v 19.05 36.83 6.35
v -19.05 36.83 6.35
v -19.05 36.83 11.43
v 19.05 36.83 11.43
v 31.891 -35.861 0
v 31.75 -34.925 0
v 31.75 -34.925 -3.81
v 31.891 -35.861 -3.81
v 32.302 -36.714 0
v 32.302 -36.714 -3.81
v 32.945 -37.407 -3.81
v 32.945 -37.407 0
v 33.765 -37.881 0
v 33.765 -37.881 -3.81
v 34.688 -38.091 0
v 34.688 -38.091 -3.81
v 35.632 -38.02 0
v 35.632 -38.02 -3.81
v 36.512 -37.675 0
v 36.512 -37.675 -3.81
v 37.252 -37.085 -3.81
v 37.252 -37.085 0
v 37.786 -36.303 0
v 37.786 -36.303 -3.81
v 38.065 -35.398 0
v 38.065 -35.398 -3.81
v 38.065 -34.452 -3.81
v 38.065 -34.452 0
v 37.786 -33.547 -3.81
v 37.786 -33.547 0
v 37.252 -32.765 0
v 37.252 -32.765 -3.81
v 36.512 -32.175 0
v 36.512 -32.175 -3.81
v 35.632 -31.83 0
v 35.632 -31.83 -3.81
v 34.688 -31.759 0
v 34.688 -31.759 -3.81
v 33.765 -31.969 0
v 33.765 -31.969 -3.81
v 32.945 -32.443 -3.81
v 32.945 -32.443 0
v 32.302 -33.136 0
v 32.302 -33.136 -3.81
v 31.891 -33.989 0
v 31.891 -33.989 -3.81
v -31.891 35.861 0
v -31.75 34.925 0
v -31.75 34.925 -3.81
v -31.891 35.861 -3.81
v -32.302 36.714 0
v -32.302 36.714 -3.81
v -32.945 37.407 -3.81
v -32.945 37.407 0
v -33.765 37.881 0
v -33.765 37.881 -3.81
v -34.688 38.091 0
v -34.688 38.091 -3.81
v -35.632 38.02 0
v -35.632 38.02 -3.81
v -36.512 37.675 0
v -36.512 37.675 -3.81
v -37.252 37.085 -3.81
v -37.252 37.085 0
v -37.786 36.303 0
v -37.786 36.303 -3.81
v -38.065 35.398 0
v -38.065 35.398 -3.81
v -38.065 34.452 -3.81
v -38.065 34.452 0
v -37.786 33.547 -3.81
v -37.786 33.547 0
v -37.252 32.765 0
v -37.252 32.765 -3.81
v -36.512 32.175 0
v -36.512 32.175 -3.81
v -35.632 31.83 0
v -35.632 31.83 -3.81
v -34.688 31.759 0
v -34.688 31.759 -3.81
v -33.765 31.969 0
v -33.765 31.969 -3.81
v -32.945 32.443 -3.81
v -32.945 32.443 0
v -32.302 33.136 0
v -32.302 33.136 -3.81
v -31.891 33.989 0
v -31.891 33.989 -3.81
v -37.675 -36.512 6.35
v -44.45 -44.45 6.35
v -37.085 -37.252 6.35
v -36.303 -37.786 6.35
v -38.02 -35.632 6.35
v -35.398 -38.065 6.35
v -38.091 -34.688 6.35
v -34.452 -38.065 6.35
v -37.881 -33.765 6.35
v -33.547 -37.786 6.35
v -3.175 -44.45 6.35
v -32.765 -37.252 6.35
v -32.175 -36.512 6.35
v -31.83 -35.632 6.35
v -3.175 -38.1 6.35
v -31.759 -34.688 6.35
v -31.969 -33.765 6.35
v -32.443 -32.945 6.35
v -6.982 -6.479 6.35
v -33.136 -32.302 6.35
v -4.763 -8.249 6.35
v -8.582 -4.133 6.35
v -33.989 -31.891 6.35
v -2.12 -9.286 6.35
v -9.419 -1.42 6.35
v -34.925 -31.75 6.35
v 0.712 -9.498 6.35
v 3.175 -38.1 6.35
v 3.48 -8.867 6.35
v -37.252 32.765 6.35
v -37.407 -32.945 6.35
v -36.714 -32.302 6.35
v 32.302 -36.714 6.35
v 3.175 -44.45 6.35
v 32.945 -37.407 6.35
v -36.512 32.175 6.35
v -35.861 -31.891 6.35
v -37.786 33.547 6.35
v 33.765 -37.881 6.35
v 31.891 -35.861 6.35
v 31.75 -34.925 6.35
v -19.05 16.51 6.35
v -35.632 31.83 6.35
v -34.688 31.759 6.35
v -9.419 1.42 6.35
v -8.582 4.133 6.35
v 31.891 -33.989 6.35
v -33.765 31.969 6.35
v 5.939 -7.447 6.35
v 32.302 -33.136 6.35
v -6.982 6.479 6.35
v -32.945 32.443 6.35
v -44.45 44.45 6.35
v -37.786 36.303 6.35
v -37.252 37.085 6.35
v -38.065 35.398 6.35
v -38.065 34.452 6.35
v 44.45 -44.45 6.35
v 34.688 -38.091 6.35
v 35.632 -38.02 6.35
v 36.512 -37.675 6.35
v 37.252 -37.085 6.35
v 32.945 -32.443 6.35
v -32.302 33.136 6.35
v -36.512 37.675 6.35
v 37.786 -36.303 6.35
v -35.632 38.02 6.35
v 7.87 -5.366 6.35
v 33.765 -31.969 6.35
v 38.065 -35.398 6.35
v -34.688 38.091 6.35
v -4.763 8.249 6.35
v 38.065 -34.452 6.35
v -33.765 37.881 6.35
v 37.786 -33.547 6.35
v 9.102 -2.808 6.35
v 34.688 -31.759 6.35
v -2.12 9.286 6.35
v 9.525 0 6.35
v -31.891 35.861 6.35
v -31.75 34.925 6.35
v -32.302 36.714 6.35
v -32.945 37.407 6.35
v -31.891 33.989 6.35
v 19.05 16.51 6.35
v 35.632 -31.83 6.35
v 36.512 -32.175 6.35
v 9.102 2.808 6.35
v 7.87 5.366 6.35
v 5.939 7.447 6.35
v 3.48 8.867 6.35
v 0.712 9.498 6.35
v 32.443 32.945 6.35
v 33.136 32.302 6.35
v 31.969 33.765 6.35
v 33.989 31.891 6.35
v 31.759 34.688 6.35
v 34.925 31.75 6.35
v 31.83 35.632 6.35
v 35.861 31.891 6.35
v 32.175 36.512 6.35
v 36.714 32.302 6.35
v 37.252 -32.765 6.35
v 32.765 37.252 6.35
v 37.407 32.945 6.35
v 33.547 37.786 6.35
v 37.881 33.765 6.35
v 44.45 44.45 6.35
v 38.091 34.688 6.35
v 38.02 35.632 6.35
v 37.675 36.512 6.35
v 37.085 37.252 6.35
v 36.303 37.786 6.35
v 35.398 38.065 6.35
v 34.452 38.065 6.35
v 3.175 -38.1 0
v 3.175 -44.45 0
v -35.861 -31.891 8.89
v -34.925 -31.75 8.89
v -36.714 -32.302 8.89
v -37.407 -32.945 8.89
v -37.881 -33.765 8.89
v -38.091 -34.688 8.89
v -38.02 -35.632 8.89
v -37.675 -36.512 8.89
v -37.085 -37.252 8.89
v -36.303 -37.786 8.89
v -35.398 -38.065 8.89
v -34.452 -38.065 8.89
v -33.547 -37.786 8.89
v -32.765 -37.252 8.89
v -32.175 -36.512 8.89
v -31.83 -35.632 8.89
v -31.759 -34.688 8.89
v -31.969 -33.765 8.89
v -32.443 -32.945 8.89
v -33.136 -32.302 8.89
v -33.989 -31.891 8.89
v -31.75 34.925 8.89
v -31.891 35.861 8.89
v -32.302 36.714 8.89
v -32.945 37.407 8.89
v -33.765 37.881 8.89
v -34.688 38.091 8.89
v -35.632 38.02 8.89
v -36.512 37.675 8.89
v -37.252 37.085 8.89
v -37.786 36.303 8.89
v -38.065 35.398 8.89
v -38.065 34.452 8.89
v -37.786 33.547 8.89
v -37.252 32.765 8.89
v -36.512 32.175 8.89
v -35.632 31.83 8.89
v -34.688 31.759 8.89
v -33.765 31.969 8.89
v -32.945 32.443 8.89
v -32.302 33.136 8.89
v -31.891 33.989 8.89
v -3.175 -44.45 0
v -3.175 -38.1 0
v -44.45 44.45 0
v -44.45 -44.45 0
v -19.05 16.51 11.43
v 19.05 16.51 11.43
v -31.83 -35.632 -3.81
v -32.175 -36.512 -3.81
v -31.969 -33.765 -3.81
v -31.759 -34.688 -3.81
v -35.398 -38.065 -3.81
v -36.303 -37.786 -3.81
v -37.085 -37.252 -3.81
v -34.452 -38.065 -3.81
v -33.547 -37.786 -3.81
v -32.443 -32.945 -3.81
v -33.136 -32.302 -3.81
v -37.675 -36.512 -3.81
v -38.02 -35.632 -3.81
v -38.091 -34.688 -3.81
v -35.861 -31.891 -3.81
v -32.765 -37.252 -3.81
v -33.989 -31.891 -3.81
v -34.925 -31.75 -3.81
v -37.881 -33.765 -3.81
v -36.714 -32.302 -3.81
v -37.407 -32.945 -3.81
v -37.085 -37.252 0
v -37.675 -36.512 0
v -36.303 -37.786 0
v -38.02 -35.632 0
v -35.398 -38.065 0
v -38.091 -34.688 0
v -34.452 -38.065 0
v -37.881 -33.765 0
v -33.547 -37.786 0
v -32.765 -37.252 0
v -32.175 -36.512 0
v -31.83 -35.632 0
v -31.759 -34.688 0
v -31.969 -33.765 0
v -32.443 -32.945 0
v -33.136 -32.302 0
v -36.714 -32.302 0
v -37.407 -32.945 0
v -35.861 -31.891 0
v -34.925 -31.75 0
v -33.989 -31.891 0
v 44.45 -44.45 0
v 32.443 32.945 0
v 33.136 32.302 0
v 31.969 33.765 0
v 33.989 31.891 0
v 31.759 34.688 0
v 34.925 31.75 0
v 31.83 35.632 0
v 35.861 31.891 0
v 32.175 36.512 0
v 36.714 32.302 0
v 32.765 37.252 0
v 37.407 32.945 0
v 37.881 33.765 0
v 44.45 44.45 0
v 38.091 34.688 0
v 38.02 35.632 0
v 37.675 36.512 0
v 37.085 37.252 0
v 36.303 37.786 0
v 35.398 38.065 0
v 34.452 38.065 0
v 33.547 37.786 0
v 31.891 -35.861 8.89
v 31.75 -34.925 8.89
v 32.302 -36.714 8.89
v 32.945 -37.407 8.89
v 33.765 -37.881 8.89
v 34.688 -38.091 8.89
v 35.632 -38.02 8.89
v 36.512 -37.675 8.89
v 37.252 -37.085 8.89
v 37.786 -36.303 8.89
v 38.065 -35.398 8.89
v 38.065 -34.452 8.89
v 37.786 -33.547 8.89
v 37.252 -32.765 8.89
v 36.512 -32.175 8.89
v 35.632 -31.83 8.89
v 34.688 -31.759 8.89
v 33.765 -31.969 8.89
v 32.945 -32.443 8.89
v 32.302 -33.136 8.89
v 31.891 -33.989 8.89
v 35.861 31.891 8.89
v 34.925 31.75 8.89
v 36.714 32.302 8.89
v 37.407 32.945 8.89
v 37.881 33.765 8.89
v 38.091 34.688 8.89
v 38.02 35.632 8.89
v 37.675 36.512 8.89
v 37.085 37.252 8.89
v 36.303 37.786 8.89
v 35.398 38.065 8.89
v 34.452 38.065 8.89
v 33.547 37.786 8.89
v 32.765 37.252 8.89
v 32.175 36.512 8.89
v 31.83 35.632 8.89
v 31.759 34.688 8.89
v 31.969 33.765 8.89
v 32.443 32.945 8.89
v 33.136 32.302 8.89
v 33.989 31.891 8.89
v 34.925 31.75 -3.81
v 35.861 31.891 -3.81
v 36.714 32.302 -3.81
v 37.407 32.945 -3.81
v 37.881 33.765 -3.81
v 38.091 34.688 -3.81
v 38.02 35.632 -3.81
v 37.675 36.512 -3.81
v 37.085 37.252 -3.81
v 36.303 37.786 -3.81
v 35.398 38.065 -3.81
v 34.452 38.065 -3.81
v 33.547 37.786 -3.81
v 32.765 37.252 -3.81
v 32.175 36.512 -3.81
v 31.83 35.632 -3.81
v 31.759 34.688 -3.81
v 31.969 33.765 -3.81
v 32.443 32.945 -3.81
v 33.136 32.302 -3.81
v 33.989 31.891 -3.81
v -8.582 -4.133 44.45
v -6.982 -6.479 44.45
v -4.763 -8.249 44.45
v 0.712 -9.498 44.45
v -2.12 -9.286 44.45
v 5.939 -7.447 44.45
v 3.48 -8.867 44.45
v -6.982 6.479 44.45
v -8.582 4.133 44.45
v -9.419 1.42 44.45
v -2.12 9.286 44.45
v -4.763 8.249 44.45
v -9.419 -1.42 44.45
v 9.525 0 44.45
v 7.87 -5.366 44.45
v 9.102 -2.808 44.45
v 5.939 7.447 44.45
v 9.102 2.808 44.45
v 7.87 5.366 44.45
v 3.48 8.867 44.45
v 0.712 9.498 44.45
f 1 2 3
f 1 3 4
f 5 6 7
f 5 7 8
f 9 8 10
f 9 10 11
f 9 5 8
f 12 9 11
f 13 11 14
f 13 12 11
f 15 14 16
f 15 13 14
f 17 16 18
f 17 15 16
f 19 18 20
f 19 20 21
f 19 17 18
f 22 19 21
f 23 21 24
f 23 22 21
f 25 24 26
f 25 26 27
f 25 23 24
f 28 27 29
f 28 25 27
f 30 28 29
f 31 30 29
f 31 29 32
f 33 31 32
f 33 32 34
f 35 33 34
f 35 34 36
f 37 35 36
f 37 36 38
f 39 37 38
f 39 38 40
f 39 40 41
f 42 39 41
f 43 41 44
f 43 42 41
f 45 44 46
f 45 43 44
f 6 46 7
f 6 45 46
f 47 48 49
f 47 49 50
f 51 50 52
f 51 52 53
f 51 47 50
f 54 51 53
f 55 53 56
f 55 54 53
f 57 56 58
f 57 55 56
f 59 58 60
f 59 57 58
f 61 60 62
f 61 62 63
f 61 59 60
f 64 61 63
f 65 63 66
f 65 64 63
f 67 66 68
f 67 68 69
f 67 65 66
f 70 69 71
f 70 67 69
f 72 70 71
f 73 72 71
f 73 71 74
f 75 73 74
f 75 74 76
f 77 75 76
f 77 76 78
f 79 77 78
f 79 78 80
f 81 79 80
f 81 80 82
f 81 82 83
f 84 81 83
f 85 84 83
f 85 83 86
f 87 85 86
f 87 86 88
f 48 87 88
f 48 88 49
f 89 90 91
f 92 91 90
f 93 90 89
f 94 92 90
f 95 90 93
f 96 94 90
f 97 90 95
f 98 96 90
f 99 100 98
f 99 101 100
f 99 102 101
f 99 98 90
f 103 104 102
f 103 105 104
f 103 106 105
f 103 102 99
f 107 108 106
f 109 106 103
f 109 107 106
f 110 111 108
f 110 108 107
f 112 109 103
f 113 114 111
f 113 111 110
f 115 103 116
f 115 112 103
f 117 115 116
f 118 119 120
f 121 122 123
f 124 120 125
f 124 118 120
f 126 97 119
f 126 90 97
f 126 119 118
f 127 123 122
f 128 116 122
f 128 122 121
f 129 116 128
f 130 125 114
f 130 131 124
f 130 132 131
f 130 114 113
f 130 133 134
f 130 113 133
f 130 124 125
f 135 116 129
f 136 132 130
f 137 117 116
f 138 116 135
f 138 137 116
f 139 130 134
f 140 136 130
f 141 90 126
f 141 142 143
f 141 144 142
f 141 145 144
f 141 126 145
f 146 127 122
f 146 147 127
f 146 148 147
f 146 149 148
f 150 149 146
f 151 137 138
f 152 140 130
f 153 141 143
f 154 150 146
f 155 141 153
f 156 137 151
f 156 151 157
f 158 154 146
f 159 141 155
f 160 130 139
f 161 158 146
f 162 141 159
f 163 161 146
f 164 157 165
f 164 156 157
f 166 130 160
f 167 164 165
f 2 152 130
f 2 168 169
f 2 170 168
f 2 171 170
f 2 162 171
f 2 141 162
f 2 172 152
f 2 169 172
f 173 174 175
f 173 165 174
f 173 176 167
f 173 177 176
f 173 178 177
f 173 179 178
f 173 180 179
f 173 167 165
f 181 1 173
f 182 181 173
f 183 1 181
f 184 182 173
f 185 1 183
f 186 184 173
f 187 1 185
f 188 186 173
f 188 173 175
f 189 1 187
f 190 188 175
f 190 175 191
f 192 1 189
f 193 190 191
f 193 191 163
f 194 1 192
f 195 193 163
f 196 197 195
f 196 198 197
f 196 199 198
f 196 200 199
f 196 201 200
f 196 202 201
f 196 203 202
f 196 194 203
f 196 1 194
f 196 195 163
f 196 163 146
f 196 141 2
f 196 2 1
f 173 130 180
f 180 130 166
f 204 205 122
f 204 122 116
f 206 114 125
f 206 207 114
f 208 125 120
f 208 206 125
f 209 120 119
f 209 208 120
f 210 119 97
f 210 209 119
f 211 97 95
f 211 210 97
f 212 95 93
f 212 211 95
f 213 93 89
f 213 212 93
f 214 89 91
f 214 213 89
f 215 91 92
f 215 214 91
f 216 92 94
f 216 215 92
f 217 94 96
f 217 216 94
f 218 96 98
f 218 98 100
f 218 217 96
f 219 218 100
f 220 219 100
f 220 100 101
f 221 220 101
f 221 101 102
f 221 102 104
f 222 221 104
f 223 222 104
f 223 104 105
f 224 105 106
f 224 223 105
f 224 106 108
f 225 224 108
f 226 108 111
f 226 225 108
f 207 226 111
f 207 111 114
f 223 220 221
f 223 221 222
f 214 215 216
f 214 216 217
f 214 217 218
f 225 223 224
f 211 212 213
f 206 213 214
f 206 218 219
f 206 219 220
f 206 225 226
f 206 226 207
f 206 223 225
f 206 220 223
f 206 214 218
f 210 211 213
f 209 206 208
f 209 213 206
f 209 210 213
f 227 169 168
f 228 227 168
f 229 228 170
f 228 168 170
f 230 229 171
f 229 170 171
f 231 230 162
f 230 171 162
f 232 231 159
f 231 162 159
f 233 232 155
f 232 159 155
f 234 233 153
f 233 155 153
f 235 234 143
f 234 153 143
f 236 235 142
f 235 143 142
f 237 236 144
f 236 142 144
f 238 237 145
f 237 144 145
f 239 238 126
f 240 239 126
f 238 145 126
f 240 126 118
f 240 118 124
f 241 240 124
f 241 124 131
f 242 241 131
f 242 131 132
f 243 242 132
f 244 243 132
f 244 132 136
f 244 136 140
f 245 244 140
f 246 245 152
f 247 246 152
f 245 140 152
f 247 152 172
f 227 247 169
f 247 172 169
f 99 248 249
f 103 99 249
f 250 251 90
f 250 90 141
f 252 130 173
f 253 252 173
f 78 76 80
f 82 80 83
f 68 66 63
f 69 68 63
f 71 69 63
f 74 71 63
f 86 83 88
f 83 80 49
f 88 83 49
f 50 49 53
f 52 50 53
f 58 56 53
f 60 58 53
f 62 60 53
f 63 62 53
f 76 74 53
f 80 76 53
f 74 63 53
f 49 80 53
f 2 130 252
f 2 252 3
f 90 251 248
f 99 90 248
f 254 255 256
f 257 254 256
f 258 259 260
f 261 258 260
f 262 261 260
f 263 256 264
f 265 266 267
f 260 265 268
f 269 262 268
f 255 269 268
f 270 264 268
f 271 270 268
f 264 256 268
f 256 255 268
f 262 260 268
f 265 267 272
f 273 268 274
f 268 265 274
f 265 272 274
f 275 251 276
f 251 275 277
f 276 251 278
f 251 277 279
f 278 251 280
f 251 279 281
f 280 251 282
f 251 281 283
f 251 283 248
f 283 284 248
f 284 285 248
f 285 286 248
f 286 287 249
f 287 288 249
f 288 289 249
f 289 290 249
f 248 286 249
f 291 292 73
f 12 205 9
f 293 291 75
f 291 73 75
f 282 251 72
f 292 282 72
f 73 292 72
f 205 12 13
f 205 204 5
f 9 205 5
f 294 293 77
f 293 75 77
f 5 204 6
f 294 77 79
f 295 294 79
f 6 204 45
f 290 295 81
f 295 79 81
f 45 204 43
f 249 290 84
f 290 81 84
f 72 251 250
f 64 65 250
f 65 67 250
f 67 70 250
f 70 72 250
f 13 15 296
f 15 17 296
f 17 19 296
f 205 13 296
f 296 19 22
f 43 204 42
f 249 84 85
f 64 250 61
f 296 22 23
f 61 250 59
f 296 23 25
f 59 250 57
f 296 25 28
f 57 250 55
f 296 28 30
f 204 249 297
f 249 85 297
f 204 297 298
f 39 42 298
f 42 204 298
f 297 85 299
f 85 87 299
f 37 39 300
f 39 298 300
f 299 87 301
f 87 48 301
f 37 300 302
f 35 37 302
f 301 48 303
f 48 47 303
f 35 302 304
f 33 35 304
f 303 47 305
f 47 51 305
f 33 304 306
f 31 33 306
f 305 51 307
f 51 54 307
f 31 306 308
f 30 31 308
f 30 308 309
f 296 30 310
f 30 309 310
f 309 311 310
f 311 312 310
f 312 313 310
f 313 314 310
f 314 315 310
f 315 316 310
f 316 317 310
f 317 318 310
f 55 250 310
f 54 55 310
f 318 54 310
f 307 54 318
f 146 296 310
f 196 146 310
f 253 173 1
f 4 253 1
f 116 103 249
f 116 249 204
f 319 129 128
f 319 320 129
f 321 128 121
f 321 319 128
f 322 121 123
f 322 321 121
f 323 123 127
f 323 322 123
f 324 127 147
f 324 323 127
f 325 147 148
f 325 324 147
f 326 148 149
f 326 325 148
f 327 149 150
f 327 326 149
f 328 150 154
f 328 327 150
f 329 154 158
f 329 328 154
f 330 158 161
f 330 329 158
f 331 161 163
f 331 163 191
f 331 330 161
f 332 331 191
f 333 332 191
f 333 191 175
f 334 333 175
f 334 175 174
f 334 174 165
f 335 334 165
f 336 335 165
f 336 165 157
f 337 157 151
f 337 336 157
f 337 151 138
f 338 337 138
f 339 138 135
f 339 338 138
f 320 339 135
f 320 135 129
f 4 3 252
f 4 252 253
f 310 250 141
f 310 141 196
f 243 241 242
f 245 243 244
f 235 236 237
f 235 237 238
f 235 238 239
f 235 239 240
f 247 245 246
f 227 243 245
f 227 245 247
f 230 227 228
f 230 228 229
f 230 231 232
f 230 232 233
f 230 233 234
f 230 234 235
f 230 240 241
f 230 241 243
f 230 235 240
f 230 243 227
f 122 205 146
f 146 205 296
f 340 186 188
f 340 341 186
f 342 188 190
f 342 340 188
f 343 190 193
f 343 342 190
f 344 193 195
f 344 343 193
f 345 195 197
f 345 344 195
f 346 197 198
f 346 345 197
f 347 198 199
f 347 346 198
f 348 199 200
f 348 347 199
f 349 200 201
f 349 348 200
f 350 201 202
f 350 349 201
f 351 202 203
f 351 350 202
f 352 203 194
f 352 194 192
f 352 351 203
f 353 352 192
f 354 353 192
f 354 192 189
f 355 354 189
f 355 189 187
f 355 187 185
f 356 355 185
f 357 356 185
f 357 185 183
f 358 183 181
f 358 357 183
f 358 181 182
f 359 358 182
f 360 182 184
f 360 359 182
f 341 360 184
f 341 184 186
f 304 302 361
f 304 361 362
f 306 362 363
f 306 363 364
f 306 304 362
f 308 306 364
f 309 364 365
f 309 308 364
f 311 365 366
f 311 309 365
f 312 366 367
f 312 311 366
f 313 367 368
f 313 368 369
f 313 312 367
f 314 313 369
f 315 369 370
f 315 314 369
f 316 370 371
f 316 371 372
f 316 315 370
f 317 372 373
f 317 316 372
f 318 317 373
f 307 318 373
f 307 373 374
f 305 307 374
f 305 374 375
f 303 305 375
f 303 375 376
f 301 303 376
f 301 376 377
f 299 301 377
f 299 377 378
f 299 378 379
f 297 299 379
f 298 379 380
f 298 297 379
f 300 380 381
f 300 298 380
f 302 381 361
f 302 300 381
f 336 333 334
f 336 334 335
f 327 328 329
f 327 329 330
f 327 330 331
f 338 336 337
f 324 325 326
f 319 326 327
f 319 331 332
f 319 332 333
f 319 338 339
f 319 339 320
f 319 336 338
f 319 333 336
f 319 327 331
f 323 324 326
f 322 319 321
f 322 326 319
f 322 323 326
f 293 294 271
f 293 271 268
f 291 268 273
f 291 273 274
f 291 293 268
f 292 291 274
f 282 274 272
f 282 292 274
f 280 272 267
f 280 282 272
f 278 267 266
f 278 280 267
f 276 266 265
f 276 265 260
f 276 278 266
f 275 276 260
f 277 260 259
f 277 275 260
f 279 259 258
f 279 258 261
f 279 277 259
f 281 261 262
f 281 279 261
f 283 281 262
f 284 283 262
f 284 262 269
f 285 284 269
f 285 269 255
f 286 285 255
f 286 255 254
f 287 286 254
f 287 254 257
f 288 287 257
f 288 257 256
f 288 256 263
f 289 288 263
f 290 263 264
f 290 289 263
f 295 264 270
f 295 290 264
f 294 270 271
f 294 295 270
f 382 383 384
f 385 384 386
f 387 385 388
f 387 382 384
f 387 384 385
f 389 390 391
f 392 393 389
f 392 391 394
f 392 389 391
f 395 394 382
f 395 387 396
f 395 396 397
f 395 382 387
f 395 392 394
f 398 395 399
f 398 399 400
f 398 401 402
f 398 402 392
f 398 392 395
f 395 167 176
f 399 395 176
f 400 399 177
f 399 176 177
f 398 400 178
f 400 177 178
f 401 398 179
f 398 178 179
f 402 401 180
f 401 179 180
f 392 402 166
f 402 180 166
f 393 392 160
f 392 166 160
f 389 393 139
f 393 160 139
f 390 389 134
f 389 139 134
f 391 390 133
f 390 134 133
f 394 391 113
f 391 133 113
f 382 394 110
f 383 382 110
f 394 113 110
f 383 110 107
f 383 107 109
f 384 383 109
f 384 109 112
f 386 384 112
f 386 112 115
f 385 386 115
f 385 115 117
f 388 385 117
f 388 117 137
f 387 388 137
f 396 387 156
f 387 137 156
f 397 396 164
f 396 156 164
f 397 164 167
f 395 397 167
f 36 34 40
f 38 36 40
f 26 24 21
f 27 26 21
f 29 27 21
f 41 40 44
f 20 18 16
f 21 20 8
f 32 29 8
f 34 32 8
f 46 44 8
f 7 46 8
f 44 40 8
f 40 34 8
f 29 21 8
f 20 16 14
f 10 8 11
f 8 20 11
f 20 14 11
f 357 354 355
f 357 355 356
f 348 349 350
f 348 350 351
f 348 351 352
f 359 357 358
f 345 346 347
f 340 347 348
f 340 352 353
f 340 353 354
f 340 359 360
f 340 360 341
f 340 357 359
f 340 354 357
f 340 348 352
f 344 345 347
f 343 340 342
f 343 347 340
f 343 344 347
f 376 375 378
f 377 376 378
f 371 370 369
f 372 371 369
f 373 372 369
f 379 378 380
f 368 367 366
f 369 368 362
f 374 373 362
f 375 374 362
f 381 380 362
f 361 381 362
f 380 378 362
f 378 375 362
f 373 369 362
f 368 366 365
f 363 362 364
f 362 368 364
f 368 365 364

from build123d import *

# Parameters (mm, degrees)
F0_W            = 88.9
F0_H            = 88.9
F1_DEPTH        = 6.35
F2_R            = 9.525
F3_DEPTH        = 38.1
F4_W            = 38.1
F4_H            = 20.32
F5_DEPTH        = 5.08
F6_R            = 3.175
F7_DEPTH        = 10.16
F7_DEPTH_BACK   = 2.54
F7_COPIES_COUNT = 4
F8_W            = 6.35
F8_H            = 6.35
F9_DEPTH        = 6.35


# Not quite as in the source:
# - a pattern or mirror of a feature is missing from the dataset's text; its kind, count and spacing are read off the source's solid


with BuildPart() as f1:
    # F0 (on Top) → F1 (new body)
    with BuildSketch(Plane.XY):
        Rectangle(F0_W, F0_H)
    extrude(amount=F1_DEPTH)

    # F2 (on face) → F3 (join)
    with BuildSketch(Plane.XY.offset(6.35)):
        Circle(F2_R)
    extrude(amount=F3_DEPTH)

    # F4 (on face) → F5 (join)
    with BuildSketch(Plane.XY.offset(6.35)):
        with Locations((0, 26.67)):
            Rectangle(F4_W, F4_H)
    extrude(amount=F5_DEPTH)

    # F6 (on face) → F7 (join, two sides)
    with BuildSketch(Plane.XY.offset(6.35)) as f7_sk:
        with Locations((-34.925, 34.925)):
            Circle(F6_R)
    f7 = extrude(amount=-F7_DEPTH) + extrude(f7_sk.sketch, amount=F7_DEPTH_BACK)

    # F7_copies: F7 ×4 about axis
    f7_copies_axis = Axis((0, 0, 0), (0, 0, 1))
    for i in range(1, F7_COPIES_COUNT):
        add(f7.rotate(f7_copies_axis, i * 360 / F7_COPIES_COUNT))

    # F8 (on face) → F9 (cut)
    with BuildSketch(Plane.XY.offset(6.35)):
        with Locations((0, -41.275)):
            Rectangle(F8_W, F8_H)
    extrude(amount=-F9_DEPTH, mode=Mode.SUBTRACT)


solid = f1.part
